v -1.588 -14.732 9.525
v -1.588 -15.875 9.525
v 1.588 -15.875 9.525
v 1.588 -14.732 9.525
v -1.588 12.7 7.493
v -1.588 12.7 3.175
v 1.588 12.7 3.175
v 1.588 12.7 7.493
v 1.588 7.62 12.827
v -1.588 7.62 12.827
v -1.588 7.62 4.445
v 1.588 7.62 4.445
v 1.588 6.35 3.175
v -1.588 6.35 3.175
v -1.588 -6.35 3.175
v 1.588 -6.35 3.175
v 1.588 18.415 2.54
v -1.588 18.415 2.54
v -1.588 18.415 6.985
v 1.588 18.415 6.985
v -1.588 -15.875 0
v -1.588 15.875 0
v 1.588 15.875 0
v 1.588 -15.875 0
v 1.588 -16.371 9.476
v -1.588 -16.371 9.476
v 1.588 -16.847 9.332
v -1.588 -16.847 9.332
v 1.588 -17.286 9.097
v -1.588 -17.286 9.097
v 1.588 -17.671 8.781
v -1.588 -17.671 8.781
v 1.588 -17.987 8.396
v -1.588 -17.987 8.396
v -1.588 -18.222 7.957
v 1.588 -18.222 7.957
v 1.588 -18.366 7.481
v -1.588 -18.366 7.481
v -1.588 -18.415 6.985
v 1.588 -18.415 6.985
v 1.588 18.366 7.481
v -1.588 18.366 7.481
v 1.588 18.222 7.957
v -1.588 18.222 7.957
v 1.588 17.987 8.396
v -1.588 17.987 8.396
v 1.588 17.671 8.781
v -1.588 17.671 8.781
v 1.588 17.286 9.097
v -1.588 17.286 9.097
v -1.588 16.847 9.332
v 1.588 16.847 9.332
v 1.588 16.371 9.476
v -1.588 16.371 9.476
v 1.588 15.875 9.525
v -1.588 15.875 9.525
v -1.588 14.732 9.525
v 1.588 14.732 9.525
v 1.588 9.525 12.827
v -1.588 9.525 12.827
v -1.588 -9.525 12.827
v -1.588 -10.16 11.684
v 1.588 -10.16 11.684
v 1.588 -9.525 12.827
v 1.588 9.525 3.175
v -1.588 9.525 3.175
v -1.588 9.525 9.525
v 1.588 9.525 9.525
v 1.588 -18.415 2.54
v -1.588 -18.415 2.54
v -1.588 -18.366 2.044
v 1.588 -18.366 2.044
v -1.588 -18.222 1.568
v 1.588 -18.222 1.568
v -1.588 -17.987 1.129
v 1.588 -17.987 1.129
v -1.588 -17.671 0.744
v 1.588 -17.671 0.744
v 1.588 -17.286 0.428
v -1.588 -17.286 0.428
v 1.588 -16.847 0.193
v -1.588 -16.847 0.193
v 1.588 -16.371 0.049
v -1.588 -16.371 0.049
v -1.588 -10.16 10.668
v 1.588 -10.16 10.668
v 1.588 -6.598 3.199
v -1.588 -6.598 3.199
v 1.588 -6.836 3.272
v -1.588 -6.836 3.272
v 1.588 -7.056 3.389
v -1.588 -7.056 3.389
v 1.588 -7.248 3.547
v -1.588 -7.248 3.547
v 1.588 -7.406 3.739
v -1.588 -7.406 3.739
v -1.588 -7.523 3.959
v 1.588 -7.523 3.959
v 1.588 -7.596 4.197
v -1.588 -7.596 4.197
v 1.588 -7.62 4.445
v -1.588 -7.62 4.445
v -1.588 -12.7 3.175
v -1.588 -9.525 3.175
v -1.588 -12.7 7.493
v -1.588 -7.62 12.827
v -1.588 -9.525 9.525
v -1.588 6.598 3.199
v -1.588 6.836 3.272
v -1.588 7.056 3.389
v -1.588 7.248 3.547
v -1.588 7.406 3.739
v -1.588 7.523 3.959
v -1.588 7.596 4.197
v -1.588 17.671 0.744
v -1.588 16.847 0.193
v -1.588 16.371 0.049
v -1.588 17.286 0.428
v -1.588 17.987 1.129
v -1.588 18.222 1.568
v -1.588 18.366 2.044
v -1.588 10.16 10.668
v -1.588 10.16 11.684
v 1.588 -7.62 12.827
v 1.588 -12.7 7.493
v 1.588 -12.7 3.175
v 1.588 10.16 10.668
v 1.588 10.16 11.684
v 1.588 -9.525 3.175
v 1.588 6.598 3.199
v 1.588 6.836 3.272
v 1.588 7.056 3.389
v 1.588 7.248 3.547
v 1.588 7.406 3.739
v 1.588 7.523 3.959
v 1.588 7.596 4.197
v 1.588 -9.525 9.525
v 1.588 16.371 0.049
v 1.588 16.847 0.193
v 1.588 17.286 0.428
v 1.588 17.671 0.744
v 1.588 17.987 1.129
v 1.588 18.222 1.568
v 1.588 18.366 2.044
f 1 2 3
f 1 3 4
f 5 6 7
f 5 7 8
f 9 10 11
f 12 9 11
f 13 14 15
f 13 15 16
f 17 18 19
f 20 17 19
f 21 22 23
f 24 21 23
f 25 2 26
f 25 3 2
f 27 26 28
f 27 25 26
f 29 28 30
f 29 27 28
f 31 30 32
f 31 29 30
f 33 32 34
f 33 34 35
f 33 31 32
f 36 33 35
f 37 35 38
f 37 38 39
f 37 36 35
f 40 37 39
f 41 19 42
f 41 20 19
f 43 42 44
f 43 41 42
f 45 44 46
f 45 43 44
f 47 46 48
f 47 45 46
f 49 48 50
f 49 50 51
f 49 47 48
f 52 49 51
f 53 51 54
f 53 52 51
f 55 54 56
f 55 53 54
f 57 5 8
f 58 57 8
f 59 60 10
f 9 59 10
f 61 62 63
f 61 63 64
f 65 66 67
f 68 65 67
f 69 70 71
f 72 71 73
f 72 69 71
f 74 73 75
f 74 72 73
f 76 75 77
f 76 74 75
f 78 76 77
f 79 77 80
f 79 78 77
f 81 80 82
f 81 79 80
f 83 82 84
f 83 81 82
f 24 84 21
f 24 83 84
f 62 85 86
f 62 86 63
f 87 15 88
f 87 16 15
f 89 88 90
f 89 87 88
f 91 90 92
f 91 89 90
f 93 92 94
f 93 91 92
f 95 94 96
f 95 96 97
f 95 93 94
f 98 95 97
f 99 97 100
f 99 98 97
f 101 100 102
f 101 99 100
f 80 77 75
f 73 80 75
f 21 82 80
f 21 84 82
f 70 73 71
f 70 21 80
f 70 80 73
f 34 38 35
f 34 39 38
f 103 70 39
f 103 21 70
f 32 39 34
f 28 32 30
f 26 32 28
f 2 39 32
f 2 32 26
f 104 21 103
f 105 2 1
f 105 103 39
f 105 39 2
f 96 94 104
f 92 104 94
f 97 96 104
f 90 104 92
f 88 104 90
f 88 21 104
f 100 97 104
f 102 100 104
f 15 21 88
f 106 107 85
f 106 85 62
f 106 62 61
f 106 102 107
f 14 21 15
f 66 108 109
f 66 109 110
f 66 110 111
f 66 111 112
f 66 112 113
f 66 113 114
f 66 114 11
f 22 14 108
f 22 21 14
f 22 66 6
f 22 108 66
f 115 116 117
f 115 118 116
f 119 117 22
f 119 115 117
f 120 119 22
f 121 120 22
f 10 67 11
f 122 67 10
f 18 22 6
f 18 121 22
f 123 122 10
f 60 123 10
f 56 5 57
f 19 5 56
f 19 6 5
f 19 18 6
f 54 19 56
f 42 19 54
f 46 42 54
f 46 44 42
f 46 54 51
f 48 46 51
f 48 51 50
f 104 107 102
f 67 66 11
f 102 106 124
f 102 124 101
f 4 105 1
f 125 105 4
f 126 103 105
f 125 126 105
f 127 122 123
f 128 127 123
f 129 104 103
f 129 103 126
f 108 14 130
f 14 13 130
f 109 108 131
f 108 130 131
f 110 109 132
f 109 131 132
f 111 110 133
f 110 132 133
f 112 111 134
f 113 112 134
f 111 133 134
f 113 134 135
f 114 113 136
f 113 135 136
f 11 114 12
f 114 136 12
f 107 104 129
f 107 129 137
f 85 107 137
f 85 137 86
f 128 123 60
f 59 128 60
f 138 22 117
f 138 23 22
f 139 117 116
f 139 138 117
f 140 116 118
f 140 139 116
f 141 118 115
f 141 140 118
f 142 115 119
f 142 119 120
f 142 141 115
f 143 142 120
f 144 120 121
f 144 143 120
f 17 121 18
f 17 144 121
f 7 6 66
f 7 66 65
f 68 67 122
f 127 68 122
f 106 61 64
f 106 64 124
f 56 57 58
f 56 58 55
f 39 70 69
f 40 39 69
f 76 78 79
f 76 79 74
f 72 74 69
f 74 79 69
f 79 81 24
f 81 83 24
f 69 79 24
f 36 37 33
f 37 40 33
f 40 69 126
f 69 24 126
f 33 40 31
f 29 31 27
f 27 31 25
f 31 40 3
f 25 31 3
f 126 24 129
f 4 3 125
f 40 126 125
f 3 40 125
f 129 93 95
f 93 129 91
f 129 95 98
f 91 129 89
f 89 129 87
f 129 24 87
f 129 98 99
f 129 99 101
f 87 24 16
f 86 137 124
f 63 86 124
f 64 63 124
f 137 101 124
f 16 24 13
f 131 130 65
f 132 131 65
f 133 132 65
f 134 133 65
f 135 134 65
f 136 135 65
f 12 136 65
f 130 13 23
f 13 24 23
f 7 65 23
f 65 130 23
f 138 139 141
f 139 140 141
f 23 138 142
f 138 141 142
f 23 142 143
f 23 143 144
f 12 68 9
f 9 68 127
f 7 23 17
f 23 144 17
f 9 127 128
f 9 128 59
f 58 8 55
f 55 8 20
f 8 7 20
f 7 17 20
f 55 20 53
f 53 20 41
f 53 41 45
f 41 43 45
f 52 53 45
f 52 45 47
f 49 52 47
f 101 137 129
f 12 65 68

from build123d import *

# Parameters (mm, degrees)
SKETCH1_W      = 3.175
SKETCH1_H      = 36.83
BASE_DEPTH     = 3.175
SKETCH3_W      = 6.35
SKETCH3_H      = 5.715
RETAINER_DEPTH = 3.175
TAB_DEPTH      = 3.175
FILLET1_R      = 1.27
FILLET2_R      = 2.54
CHAMFER1_SIZE  = 2.032


with BuildPart() as part:
    # Sketch1 → Base (new body)
    with BuildSketch(Plane.XY):
        Rectangle(SKETCH1_W, SKETCH1_H)
    extrude(amount=BASE_DEPTH)

    # Sketch3 → Retainer (add)
    with BuildSketch(Plane.ZY.offset(1.5875)):
        with Locations((6.35, 15.5575)):
            Rectangle(SKETCH3_W, SKETCH3_H)
        with Locations((6.35, -15.5575)):
            Rectangle(SKETCH3_W, SKETCH3_H)
    extrude(amount=-RETAINER_DEPTH)

    # Sketch5 → Tab (add)
    with BuildSketch(Plane.ZY.offset(1.5875)):
        Polygon((3.175, 9.525), (9.525, 9.525), (10.668, 10.16), (11.684, 10.16), (12.827, 9.525), (12.827, 7.62), (3.175, 7.62), align=None)
        Polygon((12.827, -7.62), (3.175, -7.62), (3.175, -9.525), (9.525, -9.525), (10.668, -10.16), (11.684, -10.16), (12.827, -9.525), align=None)
    extrude(amount=-TAB_DEPTH)

    # Fillet1
    fillet1_edges = [part.edges().sort_by_distance(p)[0] for p in [
        (0, 7.62, 3.175),
        (0, -7.62, 3.175),
    ]]
    fillet(fillet1_edges, radius=FILLET1_R)

    # Fillet2
    fillet2_edges = [part.edges().sort_by_distance(p)[0] for p in [
        (0, 18.415, 9.525),
        (0, -18.415, 9.525),
        (0, -18.415, 0),
        (0, 18.415, 0),
    ]]
    fillet(fillet2_edges, radius=FILLET2_R)

    # Chamfer1
    chamfer1_edges = [part.edges().sort_by_distance(p)[0] for p in [
        (0, 12.7, 9.525),
        (0, -12.7, 9.525),
    ]]
    chamfer(chamfer1_edges, length=CHAMFER1_SIZE)


solid = part.part
